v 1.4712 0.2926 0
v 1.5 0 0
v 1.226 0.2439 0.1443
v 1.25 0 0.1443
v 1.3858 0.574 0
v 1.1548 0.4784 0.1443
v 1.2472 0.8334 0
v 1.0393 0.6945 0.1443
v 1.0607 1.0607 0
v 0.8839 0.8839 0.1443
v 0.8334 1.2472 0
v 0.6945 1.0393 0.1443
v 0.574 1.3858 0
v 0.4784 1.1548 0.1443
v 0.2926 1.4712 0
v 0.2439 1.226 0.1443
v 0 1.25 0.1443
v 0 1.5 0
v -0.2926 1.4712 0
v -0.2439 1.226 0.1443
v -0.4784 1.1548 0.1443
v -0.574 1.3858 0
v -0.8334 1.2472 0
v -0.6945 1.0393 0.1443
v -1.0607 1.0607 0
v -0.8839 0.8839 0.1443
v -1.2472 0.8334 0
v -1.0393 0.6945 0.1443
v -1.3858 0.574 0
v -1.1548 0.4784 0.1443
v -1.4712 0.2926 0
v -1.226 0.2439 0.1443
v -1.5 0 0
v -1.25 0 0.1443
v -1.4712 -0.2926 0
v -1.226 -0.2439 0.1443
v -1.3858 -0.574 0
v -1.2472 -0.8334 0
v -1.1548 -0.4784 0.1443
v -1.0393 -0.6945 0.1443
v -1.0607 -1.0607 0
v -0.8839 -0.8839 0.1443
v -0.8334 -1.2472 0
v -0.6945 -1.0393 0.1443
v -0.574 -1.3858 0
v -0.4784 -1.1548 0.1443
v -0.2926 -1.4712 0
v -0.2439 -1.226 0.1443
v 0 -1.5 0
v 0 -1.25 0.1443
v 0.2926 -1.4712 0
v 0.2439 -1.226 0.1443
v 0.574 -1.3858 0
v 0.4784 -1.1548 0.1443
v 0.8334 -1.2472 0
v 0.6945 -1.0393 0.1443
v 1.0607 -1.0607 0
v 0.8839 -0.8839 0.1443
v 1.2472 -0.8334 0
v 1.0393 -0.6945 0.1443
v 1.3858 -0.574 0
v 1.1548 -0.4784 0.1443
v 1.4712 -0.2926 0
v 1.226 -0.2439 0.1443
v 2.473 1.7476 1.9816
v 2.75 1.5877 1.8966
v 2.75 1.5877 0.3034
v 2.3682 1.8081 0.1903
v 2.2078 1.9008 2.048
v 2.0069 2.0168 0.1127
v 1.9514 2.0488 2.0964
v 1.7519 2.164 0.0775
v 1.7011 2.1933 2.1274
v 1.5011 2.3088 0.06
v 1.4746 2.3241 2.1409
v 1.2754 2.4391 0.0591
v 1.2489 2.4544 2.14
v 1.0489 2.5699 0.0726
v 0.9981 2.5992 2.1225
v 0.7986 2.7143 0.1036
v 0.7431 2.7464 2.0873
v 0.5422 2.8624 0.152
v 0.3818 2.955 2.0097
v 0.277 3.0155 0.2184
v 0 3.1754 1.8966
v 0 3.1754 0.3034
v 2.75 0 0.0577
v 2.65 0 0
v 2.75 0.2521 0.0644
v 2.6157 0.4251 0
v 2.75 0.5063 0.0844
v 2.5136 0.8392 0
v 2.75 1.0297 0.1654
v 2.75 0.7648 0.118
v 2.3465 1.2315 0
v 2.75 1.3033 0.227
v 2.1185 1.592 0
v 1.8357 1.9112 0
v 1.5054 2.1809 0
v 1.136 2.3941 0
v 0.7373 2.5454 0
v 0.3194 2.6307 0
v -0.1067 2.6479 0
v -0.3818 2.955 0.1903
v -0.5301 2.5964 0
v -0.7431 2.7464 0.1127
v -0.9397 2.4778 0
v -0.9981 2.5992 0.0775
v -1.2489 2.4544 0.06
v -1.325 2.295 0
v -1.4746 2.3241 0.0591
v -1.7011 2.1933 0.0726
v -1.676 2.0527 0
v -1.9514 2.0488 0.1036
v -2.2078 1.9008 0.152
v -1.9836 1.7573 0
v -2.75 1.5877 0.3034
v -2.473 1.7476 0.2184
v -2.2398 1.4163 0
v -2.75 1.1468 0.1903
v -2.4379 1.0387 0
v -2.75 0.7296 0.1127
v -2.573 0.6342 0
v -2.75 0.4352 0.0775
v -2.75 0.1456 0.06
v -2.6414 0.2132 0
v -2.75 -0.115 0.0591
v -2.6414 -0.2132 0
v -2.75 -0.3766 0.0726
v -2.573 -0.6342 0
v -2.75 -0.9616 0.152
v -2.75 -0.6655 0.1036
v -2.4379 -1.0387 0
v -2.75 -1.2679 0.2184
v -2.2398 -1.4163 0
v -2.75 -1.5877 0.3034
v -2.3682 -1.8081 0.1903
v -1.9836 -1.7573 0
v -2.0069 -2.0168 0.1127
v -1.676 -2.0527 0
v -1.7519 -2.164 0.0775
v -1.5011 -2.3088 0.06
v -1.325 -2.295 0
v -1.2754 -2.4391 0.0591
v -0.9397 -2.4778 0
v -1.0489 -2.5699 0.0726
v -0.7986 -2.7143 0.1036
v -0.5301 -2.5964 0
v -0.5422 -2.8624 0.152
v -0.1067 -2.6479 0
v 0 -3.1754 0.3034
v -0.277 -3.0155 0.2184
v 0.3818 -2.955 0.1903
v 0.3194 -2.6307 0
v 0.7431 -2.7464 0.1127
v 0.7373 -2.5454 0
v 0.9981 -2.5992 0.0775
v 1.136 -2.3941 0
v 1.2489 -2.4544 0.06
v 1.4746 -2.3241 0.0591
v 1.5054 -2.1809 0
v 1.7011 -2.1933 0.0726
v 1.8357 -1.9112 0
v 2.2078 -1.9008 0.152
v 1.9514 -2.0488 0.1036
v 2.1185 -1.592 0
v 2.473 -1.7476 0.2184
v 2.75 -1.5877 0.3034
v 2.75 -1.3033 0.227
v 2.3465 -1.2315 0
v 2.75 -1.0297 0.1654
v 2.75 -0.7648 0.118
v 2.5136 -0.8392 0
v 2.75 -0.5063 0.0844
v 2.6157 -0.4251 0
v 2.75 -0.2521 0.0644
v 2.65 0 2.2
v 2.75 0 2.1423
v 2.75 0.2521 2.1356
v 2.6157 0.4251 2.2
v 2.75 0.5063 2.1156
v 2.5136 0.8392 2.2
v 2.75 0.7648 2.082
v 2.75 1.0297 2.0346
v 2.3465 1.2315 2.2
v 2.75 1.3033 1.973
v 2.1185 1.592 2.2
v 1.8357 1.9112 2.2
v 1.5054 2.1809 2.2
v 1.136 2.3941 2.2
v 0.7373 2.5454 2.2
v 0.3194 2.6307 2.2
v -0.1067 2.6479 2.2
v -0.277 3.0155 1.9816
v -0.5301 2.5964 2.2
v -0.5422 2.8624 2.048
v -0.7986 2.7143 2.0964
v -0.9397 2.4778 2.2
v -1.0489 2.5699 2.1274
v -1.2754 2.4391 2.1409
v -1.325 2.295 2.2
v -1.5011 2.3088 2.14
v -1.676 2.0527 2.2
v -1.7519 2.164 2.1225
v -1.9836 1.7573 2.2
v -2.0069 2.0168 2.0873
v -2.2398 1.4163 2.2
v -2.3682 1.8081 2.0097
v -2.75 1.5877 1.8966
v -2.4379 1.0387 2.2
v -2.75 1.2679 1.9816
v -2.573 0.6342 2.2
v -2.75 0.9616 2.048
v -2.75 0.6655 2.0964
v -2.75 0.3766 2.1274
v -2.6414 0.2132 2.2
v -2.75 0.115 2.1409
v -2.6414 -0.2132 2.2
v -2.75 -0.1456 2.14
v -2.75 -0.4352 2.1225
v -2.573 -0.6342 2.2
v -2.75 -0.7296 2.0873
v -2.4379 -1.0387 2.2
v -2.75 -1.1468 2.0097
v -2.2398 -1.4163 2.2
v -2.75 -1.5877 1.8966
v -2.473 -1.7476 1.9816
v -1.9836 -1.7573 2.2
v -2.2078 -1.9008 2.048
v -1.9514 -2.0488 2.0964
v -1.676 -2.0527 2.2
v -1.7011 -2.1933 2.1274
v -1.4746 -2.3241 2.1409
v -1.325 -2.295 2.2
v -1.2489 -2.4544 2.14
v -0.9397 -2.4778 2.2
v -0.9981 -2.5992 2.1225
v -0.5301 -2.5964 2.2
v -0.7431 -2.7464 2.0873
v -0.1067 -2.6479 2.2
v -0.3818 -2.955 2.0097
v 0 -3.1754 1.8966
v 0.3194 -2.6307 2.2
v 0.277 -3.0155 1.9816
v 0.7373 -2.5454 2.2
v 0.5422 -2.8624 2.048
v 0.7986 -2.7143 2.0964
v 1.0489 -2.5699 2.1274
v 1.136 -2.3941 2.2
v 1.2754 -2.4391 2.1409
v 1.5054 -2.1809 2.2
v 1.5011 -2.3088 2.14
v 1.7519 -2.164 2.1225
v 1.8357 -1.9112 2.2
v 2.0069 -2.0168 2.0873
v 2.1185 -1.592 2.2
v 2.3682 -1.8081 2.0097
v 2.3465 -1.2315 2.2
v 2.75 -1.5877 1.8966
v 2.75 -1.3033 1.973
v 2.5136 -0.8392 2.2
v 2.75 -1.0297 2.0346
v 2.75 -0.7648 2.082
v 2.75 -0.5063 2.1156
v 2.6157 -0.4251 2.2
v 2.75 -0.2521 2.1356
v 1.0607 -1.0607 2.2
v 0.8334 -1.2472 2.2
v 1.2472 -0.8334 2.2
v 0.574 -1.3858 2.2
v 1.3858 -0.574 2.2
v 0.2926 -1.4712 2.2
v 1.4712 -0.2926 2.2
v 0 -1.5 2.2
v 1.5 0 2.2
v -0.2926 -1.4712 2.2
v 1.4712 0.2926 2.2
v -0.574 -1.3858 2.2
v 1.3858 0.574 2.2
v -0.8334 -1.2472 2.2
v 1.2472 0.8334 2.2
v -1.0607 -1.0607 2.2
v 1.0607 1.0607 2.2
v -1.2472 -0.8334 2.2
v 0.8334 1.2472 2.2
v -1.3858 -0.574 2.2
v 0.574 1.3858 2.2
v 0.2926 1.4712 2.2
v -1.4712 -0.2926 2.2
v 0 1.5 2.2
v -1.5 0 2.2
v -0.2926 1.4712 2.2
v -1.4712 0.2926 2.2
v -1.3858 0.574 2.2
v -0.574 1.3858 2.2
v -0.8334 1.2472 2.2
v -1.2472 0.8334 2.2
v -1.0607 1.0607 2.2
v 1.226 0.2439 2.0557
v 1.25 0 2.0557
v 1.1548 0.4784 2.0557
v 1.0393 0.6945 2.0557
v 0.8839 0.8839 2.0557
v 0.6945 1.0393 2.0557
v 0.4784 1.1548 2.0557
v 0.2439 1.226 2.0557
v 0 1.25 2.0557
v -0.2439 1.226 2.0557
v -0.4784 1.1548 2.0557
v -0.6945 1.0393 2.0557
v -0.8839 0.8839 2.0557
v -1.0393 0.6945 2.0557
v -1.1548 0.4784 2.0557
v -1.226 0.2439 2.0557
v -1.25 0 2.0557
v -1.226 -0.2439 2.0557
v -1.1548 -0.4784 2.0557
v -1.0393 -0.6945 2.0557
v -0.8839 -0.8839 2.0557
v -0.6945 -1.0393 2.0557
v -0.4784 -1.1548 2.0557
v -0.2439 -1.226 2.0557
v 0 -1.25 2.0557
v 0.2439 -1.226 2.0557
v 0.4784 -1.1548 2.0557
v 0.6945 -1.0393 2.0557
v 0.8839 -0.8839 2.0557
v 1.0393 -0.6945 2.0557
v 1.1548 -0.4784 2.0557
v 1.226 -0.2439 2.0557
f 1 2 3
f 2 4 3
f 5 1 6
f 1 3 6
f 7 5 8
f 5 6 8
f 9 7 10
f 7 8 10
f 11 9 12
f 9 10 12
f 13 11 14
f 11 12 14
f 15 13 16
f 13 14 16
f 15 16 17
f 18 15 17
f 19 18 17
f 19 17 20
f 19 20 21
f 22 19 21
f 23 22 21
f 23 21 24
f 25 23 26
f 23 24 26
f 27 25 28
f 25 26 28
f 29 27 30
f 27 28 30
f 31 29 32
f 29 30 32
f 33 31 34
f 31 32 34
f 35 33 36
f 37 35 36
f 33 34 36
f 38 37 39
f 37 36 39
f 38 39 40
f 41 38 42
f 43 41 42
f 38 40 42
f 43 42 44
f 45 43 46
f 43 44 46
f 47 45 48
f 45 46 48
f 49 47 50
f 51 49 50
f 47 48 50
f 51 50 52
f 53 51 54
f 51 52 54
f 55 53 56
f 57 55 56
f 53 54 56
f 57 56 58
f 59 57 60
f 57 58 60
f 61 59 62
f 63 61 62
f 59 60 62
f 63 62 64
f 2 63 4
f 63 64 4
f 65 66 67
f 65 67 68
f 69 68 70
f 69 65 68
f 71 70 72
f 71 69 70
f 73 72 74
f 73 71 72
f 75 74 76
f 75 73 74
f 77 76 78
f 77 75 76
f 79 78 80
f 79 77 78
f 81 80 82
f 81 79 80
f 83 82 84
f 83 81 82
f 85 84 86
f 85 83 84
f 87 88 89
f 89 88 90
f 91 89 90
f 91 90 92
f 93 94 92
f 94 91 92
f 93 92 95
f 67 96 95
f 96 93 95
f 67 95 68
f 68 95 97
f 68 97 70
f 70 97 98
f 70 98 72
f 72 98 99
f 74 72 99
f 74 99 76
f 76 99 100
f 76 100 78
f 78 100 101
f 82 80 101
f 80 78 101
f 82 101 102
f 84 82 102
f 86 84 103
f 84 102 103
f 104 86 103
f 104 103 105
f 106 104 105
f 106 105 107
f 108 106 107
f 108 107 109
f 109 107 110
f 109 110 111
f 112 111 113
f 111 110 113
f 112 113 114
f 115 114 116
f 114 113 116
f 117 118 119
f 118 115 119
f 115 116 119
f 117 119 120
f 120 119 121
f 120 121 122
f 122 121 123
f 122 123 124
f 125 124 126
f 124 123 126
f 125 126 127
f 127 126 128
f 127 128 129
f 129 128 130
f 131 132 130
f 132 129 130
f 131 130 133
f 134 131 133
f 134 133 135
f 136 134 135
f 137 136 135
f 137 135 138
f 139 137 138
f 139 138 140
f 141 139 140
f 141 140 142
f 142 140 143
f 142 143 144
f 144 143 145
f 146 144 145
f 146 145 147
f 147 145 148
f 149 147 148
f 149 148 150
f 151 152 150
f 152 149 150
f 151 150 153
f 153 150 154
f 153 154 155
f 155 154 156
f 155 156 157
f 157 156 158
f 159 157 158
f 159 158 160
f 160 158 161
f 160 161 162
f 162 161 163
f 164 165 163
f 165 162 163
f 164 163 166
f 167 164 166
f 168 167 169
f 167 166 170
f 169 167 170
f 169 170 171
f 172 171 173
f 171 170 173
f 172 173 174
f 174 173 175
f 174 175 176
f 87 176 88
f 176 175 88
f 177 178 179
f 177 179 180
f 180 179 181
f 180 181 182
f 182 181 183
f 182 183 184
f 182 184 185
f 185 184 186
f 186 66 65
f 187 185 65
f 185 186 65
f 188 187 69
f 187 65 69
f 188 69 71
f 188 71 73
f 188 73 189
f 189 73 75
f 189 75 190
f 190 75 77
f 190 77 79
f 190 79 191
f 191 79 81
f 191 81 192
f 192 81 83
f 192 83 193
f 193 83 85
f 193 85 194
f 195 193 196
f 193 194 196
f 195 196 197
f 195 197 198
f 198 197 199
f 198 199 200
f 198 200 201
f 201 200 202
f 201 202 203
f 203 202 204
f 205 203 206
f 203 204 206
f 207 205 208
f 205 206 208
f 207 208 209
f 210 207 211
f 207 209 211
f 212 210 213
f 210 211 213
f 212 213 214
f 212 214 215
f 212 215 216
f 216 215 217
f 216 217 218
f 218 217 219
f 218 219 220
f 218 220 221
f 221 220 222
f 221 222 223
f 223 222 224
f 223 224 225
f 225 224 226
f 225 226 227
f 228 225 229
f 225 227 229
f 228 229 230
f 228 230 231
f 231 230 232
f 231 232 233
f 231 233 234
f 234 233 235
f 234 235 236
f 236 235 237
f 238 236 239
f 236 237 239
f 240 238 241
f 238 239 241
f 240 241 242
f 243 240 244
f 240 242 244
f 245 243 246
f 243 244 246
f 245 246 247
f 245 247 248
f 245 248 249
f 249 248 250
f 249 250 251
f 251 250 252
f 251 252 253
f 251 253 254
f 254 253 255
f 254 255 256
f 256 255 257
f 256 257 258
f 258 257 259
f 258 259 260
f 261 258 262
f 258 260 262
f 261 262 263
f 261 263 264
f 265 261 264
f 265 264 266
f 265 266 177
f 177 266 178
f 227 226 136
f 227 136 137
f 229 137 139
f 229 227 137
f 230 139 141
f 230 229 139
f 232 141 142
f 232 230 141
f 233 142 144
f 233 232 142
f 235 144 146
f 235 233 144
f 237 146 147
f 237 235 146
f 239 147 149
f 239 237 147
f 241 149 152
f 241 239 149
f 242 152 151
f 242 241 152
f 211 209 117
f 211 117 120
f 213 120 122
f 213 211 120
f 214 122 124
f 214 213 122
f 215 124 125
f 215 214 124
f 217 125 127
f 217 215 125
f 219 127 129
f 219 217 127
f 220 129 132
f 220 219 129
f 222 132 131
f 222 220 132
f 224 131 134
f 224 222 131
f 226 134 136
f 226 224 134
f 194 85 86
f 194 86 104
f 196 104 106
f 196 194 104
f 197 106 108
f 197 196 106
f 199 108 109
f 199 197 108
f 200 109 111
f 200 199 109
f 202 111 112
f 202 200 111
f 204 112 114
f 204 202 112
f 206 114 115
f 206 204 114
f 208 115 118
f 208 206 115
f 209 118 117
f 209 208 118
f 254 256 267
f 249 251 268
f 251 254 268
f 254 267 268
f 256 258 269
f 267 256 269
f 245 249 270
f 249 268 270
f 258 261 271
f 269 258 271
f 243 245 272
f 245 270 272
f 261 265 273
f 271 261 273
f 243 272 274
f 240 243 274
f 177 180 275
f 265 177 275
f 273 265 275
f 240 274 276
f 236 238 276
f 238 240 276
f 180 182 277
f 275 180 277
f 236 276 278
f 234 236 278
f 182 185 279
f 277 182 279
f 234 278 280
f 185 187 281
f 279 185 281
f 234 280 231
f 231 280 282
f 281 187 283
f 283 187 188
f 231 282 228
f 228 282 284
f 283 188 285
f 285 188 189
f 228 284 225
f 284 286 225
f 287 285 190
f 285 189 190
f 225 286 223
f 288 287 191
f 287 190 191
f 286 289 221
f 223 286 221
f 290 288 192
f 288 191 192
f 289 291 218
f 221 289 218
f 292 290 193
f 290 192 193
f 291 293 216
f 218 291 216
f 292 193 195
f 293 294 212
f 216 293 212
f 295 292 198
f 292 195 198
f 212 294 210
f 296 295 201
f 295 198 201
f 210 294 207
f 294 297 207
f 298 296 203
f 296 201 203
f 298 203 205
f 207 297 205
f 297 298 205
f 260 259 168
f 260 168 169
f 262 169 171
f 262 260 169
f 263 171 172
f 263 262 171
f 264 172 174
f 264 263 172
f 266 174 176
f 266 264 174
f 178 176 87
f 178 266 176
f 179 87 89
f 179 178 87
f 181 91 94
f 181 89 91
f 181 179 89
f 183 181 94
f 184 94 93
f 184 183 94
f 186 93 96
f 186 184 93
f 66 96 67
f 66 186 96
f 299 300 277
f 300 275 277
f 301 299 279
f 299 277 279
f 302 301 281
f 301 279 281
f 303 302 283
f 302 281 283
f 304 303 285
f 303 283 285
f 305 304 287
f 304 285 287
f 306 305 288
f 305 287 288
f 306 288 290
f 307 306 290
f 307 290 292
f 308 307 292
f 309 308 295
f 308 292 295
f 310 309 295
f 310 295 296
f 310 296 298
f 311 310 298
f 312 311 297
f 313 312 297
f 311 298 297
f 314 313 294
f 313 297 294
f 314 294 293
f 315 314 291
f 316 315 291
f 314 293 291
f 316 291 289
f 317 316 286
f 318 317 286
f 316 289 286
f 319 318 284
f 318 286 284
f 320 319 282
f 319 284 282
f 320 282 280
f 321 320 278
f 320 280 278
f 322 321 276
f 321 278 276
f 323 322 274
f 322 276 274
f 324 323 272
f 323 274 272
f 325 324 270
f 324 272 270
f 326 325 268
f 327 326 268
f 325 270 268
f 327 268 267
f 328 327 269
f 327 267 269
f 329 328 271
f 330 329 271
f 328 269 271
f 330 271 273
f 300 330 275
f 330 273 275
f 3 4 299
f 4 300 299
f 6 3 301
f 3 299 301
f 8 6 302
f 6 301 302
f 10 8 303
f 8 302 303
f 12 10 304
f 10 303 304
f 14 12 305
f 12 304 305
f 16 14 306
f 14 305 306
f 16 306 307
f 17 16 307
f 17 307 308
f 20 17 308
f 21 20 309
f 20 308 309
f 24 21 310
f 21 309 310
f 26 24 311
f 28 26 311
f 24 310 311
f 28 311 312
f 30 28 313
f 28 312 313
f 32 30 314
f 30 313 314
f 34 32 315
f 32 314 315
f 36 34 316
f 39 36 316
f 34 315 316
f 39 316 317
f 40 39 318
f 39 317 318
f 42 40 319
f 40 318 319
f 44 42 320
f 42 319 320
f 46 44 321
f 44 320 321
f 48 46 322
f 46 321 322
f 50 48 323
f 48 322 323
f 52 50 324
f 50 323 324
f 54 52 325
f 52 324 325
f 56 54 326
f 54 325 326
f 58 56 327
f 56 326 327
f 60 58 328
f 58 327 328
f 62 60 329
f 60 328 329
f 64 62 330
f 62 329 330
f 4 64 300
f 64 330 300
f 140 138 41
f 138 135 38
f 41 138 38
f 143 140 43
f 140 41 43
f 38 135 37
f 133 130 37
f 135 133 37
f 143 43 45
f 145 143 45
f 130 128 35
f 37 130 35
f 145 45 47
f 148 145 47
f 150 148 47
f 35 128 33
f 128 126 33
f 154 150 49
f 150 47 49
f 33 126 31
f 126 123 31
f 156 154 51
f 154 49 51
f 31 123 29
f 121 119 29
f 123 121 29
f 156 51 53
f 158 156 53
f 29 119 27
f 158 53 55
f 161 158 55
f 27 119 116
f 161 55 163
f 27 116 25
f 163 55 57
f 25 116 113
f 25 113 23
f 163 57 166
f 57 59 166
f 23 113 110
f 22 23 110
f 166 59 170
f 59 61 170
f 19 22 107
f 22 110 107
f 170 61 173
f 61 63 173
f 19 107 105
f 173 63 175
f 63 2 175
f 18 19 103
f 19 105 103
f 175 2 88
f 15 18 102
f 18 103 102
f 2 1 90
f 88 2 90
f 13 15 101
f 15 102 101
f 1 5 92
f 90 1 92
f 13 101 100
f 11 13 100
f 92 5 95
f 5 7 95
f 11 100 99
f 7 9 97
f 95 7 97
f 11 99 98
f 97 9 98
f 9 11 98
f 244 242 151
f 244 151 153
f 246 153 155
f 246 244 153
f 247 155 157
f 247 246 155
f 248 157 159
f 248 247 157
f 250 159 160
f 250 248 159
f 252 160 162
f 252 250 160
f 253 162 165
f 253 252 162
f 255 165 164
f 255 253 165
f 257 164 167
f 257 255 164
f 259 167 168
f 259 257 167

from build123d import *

# Parameters (mm, degrees)
SKETCH001_R  = 3.5
POCKET_DEPTH = 2.2


with BuildPart() as part:
    # Sketch → Revolution (revolve)
    with BuildSketch(Plane.XZ):
        Polygon((1.5, 0), (1.25, 0.144338), (1.25, 2.055662), (1.5, 2.2), (2.65, 2.2), (3.5, 1.709252), (3.5, 0.490748), (2.65, 0), align=None)
    revolve(axis=Axis((0, 0, 0), (0, 0, 1)))

    # Sketch001 → Pocket (cut)
    with BuildSketch(Plane(origin=(0, 0, 2.2), x_dir=(-1, 0, 0), z_dir=(0, 0, 1))):
        Circle(SKETCH001_R)
        Polygon((-2.75, 1.587713), (-2.75, -1.587713), (0, -3.175426), (2.75, -1.587713), (2.75, 1.587713), (0, 3.175426), align=None, mode=Mode.SUBTRACT)
    extrude(amount=-POCKET_DEPTH, mode=Mode.SUBTRACT)


solid = part.part
